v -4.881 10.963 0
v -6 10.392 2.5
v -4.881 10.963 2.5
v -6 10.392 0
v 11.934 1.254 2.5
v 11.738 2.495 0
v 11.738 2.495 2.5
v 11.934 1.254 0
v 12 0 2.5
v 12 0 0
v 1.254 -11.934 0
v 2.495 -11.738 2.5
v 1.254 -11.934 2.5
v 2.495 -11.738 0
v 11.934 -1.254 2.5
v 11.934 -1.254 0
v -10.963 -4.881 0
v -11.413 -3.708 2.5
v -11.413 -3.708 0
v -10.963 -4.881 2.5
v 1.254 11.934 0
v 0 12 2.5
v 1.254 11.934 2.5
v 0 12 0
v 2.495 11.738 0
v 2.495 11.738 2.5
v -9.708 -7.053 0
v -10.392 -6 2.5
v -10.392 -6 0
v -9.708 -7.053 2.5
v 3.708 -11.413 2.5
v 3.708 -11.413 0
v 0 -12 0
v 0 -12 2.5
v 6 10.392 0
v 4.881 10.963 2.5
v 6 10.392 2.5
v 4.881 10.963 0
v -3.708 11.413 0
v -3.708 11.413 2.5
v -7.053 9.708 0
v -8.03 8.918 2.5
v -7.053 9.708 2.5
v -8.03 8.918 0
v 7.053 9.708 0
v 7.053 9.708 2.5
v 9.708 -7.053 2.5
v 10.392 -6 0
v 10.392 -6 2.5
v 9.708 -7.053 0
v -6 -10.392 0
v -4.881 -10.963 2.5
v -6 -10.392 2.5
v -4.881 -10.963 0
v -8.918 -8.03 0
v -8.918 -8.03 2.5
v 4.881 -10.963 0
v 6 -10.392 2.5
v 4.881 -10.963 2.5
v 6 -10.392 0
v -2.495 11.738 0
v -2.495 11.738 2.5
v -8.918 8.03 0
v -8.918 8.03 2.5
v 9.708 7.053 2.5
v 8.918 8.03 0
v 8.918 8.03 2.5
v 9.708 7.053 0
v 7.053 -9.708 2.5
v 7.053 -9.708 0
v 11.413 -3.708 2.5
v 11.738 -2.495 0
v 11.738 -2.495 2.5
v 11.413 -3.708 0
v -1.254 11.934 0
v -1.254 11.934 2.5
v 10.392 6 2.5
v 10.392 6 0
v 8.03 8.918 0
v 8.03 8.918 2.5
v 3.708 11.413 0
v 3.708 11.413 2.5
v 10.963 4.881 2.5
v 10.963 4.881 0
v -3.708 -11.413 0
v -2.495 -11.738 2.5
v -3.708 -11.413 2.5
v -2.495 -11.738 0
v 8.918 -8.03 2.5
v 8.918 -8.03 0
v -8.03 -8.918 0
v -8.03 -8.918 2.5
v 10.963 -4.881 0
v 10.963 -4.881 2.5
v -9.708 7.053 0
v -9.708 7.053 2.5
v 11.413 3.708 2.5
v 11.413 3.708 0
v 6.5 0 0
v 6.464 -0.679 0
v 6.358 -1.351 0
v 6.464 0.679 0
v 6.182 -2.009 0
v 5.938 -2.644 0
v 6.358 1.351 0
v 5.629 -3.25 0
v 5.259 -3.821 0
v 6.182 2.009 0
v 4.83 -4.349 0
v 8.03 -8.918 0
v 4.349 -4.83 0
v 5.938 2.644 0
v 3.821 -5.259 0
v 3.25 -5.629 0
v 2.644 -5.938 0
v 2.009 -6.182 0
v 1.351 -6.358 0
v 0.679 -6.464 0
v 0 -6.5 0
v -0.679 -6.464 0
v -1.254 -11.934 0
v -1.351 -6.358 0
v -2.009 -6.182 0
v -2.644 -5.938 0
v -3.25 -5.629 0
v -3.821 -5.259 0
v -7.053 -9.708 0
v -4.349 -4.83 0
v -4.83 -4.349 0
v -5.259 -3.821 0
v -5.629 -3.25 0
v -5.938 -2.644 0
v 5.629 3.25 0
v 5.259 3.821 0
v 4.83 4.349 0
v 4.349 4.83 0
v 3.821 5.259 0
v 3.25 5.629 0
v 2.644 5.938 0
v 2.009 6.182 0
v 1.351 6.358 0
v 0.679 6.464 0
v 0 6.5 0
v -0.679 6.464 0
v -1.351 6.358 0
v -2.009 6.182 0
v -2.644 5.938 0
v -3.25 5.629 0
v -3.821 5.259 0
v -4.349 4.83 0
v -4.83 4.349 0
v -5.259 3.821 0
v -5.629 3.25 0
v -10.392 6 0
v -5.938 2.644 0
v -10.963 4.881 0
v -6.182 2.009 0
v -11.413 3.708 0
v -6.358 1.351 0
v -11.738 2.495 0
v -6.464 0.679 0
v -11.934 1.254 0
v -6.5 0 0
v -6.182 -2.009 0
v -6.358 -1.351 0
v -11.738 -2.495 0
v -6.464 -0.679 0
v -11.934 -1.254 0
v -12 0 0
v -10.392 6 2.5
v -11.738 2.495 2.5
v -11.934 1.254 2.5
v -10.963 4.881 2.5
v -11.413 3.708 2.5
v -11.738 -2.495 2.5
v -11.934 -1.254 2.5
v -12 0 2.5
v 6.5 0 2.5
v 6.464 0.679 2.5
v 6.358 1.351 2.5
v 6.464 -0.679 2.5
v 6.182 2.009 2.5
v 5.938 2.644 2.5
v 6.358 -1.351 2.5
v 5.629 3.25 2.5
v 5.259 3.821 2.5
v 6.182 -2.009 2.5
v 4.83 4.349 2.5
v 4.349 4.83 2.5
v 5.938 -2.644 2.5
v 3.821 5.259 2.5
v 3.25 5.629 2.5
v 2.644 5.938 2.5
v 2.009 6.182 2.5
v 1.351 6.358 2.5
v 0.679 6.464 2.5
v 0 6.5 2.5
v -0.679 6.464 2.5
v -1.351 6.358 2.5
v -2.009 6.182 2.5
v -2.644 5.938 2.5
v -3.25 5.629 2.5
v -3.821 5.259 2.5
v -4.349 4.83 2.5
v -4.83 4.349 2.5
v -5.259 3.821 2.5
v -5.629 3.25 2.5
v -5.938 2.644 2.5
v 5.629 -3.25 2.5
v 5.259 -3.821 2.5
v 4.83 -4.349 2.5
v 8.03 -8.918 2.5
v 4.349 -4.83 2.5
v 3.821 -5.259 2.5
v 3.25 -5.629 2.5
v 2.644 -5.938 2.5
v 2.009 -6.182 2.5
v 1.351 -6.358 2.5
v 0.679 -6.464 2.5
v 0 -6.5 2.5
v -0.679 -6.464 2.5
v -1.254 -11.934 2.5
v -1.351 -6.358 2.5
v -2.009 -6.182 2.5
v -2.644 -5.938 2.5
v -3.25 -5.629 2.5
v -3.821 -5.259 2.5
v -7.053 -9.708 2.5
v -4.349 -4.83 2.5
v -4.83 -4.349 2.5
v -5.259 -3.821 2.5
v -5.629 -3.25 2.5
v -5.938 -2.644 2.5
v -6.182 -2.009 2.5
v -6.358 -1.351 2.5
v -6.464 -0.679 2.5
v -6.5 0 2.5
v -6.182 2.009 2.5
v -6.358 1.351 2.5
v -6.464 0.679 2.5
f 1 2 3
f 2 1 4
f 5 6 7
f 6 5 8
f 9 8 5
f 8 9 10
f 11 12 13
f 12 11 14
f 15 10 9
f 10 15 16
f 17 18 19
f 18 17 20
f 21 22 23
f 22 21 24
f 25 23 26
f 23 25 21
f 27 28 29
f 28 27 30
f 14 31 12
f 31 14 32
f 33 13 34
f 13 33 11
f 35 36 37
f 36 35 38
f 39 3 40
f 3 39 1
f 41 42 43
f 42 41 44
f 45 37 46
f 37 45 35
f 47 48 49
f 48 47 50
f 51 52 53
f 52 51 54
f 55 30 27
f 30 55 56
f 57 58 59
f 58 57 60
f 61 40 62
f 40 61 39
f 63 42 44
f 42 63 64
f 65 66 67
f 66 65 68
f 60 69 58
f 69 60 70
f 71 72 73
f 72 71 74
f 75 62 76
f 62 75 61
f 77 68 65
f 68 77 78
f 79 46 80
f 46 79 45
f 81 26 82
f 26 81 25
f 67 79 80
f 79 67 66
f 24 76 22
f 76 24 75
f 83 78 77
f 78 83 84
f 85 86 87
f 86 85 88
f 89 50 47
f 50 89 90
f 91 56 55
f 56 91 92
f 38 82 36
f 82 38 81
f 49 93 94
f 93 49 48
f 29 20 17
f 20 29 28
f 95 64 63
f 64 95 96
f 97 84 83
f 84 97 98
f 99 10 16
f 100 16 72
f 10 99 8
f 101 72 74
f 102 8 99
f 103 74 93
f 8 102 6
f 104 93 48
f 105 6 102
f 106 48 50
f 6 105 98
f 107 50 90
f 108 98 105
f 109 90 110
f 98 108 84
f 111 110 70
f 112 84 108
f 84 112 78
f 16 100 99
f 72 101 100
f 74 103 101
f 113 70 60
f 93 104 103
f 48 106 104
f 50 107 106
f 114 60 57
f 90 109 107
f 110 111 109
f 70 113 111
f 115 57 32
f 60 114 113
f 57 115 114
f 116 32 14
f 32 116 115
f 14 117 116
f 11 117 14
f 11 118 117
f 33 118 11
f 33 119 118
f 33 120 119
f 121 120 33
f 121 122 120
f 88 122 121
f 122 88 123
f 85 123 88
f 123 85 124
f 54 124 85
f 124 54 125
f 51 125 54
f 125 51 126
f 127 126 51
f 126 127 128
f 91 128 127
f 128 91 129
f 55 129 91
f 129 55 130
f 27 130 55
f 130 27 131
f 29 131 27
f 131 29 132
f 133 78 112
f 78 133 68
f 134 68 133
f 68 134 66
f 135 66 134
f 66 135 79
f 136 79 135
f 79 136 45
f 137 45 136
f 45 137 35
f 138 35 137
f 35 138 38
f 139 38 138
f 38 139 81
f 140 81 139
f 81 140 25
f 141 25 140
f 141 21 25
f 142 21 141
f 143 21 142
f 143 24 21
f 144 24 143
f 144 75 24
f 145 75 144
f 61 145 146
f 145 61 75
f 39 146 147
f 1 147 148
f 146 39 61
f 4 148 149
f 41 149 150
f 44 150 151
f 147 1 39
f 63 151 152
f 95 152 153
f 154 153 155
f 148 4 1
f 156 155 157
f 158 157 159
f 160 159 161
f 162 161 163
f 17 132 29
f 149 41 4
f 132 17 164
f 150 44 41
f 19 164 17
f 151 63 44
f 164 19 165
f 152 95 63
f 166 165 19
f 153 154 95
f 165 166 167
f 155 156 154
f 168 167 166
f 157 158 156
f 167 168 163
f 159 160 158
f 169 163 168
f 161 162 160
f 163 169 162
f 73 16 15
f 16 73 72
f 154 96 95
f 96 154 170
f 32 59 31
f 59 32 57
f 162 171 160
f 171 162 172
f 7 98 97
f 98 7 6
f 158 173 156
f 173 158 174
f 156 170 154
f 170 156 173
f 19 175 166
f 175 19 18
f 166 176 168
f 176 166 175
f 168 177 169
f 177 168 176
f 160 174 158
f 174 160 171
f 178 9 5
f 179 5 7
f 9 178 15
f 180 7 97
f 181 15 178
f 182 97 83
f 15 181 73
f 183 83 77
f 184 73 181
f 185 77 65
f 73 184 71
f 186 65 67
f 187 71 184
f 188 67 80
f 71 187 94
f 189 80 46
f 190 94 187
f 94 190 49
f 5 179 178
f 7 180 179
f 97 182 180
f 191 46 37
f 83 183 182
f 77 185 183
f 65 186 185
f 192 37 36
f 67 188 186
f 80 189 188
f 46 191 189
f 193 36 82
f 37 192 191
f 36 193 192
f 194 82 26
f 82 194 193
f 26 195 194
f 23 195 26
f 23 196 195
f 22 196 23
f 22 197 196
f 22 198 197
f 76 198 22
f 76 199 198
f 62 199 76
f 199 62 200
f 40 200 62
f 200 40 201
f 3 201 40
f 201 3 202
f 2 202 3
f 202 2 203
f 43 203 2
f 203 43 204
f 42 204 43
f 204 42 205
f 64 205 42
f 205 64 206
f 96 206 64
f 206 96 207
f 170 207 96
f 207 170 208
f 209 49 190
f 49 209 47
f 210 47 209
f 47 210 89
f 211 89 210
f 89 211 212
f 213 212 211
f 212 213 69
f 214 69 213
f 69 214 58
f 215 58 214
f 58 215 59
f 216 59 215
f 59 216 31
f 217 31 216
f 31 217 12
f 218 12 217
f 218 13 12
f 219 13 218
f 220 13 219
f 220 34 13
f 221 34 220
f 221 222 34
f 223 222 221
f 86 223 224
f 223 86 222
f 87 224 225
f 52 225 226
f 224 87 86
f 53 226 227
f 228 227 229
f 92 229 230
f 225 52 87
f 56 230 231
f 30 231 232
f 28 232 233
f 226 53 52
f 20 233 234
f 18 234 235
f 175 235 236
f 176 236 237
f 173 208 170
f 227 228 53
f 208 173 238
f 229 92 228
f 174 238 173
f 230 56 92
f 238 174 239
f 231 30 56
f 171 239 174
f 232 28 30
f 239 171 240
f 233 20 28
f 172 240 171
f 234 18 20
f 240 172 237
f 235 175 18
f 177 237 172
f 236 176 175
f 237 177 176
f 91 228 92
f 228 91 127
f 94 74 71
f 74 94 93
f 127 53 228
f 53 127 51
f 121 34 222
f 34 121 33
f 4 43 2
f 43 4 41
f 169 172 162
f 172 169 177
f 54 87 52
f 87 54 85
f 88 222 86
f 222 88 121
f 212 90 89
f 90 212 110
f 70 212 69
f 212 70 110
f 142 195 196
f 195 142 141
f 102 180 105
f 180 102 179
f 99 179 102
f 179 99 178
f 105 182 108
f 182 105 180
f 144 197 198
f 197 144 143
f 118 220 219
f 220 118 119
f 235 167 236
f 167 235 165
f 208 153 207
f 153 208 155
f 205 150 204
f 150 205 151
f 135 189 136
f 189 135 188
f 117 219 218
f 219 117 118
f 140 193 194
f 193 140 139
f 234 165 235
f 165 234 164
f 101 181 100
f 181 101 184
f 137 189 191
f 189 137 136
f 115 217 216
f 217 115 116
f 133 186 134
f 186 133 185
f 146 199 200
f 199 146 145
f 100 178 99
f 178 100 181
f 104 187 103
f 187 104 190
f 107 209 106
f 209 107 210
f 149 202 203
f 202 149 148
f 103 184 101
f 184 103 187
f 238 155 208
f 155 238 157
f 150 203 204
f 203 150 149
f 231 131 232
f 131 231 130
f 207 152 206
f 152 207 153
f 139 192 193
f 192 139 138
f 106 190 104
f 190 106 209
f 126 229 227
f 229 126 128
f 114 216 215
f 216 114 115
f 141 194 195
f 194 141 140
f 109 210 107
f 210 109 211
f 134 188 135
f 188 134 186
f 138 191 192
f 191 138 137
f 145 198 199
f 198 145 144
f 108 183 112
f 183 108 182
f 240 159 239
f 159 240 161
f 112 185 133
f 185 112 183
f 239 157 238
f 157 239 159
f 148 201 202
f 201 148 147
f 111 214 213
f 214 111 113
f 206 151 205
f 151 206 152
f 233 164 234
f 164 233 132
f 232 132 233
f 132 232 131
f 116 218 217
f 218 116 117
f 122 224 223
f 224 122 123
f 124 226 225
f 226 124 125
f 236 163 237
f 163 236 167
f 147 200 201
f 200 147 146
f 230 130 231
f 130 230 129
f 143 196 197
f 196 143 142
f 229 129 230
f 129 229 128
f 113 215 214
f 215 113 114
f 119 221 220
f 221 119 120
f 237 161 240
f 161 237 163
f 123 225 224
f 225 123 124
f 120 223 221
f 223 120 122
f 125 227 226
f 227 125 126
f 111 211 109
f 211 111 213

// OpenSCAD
// Flat metric washer.
$fn = 60;
eps = 0.02;
inner_d = 13;
outer_d = 24;
thickness = 2.5;
difference() {
    cylinder(d = outer_d, h = thickness);
    translate([0, 0, -eps]) cylinder(d = inner_d, h = thickness + 2 * eps);
}
